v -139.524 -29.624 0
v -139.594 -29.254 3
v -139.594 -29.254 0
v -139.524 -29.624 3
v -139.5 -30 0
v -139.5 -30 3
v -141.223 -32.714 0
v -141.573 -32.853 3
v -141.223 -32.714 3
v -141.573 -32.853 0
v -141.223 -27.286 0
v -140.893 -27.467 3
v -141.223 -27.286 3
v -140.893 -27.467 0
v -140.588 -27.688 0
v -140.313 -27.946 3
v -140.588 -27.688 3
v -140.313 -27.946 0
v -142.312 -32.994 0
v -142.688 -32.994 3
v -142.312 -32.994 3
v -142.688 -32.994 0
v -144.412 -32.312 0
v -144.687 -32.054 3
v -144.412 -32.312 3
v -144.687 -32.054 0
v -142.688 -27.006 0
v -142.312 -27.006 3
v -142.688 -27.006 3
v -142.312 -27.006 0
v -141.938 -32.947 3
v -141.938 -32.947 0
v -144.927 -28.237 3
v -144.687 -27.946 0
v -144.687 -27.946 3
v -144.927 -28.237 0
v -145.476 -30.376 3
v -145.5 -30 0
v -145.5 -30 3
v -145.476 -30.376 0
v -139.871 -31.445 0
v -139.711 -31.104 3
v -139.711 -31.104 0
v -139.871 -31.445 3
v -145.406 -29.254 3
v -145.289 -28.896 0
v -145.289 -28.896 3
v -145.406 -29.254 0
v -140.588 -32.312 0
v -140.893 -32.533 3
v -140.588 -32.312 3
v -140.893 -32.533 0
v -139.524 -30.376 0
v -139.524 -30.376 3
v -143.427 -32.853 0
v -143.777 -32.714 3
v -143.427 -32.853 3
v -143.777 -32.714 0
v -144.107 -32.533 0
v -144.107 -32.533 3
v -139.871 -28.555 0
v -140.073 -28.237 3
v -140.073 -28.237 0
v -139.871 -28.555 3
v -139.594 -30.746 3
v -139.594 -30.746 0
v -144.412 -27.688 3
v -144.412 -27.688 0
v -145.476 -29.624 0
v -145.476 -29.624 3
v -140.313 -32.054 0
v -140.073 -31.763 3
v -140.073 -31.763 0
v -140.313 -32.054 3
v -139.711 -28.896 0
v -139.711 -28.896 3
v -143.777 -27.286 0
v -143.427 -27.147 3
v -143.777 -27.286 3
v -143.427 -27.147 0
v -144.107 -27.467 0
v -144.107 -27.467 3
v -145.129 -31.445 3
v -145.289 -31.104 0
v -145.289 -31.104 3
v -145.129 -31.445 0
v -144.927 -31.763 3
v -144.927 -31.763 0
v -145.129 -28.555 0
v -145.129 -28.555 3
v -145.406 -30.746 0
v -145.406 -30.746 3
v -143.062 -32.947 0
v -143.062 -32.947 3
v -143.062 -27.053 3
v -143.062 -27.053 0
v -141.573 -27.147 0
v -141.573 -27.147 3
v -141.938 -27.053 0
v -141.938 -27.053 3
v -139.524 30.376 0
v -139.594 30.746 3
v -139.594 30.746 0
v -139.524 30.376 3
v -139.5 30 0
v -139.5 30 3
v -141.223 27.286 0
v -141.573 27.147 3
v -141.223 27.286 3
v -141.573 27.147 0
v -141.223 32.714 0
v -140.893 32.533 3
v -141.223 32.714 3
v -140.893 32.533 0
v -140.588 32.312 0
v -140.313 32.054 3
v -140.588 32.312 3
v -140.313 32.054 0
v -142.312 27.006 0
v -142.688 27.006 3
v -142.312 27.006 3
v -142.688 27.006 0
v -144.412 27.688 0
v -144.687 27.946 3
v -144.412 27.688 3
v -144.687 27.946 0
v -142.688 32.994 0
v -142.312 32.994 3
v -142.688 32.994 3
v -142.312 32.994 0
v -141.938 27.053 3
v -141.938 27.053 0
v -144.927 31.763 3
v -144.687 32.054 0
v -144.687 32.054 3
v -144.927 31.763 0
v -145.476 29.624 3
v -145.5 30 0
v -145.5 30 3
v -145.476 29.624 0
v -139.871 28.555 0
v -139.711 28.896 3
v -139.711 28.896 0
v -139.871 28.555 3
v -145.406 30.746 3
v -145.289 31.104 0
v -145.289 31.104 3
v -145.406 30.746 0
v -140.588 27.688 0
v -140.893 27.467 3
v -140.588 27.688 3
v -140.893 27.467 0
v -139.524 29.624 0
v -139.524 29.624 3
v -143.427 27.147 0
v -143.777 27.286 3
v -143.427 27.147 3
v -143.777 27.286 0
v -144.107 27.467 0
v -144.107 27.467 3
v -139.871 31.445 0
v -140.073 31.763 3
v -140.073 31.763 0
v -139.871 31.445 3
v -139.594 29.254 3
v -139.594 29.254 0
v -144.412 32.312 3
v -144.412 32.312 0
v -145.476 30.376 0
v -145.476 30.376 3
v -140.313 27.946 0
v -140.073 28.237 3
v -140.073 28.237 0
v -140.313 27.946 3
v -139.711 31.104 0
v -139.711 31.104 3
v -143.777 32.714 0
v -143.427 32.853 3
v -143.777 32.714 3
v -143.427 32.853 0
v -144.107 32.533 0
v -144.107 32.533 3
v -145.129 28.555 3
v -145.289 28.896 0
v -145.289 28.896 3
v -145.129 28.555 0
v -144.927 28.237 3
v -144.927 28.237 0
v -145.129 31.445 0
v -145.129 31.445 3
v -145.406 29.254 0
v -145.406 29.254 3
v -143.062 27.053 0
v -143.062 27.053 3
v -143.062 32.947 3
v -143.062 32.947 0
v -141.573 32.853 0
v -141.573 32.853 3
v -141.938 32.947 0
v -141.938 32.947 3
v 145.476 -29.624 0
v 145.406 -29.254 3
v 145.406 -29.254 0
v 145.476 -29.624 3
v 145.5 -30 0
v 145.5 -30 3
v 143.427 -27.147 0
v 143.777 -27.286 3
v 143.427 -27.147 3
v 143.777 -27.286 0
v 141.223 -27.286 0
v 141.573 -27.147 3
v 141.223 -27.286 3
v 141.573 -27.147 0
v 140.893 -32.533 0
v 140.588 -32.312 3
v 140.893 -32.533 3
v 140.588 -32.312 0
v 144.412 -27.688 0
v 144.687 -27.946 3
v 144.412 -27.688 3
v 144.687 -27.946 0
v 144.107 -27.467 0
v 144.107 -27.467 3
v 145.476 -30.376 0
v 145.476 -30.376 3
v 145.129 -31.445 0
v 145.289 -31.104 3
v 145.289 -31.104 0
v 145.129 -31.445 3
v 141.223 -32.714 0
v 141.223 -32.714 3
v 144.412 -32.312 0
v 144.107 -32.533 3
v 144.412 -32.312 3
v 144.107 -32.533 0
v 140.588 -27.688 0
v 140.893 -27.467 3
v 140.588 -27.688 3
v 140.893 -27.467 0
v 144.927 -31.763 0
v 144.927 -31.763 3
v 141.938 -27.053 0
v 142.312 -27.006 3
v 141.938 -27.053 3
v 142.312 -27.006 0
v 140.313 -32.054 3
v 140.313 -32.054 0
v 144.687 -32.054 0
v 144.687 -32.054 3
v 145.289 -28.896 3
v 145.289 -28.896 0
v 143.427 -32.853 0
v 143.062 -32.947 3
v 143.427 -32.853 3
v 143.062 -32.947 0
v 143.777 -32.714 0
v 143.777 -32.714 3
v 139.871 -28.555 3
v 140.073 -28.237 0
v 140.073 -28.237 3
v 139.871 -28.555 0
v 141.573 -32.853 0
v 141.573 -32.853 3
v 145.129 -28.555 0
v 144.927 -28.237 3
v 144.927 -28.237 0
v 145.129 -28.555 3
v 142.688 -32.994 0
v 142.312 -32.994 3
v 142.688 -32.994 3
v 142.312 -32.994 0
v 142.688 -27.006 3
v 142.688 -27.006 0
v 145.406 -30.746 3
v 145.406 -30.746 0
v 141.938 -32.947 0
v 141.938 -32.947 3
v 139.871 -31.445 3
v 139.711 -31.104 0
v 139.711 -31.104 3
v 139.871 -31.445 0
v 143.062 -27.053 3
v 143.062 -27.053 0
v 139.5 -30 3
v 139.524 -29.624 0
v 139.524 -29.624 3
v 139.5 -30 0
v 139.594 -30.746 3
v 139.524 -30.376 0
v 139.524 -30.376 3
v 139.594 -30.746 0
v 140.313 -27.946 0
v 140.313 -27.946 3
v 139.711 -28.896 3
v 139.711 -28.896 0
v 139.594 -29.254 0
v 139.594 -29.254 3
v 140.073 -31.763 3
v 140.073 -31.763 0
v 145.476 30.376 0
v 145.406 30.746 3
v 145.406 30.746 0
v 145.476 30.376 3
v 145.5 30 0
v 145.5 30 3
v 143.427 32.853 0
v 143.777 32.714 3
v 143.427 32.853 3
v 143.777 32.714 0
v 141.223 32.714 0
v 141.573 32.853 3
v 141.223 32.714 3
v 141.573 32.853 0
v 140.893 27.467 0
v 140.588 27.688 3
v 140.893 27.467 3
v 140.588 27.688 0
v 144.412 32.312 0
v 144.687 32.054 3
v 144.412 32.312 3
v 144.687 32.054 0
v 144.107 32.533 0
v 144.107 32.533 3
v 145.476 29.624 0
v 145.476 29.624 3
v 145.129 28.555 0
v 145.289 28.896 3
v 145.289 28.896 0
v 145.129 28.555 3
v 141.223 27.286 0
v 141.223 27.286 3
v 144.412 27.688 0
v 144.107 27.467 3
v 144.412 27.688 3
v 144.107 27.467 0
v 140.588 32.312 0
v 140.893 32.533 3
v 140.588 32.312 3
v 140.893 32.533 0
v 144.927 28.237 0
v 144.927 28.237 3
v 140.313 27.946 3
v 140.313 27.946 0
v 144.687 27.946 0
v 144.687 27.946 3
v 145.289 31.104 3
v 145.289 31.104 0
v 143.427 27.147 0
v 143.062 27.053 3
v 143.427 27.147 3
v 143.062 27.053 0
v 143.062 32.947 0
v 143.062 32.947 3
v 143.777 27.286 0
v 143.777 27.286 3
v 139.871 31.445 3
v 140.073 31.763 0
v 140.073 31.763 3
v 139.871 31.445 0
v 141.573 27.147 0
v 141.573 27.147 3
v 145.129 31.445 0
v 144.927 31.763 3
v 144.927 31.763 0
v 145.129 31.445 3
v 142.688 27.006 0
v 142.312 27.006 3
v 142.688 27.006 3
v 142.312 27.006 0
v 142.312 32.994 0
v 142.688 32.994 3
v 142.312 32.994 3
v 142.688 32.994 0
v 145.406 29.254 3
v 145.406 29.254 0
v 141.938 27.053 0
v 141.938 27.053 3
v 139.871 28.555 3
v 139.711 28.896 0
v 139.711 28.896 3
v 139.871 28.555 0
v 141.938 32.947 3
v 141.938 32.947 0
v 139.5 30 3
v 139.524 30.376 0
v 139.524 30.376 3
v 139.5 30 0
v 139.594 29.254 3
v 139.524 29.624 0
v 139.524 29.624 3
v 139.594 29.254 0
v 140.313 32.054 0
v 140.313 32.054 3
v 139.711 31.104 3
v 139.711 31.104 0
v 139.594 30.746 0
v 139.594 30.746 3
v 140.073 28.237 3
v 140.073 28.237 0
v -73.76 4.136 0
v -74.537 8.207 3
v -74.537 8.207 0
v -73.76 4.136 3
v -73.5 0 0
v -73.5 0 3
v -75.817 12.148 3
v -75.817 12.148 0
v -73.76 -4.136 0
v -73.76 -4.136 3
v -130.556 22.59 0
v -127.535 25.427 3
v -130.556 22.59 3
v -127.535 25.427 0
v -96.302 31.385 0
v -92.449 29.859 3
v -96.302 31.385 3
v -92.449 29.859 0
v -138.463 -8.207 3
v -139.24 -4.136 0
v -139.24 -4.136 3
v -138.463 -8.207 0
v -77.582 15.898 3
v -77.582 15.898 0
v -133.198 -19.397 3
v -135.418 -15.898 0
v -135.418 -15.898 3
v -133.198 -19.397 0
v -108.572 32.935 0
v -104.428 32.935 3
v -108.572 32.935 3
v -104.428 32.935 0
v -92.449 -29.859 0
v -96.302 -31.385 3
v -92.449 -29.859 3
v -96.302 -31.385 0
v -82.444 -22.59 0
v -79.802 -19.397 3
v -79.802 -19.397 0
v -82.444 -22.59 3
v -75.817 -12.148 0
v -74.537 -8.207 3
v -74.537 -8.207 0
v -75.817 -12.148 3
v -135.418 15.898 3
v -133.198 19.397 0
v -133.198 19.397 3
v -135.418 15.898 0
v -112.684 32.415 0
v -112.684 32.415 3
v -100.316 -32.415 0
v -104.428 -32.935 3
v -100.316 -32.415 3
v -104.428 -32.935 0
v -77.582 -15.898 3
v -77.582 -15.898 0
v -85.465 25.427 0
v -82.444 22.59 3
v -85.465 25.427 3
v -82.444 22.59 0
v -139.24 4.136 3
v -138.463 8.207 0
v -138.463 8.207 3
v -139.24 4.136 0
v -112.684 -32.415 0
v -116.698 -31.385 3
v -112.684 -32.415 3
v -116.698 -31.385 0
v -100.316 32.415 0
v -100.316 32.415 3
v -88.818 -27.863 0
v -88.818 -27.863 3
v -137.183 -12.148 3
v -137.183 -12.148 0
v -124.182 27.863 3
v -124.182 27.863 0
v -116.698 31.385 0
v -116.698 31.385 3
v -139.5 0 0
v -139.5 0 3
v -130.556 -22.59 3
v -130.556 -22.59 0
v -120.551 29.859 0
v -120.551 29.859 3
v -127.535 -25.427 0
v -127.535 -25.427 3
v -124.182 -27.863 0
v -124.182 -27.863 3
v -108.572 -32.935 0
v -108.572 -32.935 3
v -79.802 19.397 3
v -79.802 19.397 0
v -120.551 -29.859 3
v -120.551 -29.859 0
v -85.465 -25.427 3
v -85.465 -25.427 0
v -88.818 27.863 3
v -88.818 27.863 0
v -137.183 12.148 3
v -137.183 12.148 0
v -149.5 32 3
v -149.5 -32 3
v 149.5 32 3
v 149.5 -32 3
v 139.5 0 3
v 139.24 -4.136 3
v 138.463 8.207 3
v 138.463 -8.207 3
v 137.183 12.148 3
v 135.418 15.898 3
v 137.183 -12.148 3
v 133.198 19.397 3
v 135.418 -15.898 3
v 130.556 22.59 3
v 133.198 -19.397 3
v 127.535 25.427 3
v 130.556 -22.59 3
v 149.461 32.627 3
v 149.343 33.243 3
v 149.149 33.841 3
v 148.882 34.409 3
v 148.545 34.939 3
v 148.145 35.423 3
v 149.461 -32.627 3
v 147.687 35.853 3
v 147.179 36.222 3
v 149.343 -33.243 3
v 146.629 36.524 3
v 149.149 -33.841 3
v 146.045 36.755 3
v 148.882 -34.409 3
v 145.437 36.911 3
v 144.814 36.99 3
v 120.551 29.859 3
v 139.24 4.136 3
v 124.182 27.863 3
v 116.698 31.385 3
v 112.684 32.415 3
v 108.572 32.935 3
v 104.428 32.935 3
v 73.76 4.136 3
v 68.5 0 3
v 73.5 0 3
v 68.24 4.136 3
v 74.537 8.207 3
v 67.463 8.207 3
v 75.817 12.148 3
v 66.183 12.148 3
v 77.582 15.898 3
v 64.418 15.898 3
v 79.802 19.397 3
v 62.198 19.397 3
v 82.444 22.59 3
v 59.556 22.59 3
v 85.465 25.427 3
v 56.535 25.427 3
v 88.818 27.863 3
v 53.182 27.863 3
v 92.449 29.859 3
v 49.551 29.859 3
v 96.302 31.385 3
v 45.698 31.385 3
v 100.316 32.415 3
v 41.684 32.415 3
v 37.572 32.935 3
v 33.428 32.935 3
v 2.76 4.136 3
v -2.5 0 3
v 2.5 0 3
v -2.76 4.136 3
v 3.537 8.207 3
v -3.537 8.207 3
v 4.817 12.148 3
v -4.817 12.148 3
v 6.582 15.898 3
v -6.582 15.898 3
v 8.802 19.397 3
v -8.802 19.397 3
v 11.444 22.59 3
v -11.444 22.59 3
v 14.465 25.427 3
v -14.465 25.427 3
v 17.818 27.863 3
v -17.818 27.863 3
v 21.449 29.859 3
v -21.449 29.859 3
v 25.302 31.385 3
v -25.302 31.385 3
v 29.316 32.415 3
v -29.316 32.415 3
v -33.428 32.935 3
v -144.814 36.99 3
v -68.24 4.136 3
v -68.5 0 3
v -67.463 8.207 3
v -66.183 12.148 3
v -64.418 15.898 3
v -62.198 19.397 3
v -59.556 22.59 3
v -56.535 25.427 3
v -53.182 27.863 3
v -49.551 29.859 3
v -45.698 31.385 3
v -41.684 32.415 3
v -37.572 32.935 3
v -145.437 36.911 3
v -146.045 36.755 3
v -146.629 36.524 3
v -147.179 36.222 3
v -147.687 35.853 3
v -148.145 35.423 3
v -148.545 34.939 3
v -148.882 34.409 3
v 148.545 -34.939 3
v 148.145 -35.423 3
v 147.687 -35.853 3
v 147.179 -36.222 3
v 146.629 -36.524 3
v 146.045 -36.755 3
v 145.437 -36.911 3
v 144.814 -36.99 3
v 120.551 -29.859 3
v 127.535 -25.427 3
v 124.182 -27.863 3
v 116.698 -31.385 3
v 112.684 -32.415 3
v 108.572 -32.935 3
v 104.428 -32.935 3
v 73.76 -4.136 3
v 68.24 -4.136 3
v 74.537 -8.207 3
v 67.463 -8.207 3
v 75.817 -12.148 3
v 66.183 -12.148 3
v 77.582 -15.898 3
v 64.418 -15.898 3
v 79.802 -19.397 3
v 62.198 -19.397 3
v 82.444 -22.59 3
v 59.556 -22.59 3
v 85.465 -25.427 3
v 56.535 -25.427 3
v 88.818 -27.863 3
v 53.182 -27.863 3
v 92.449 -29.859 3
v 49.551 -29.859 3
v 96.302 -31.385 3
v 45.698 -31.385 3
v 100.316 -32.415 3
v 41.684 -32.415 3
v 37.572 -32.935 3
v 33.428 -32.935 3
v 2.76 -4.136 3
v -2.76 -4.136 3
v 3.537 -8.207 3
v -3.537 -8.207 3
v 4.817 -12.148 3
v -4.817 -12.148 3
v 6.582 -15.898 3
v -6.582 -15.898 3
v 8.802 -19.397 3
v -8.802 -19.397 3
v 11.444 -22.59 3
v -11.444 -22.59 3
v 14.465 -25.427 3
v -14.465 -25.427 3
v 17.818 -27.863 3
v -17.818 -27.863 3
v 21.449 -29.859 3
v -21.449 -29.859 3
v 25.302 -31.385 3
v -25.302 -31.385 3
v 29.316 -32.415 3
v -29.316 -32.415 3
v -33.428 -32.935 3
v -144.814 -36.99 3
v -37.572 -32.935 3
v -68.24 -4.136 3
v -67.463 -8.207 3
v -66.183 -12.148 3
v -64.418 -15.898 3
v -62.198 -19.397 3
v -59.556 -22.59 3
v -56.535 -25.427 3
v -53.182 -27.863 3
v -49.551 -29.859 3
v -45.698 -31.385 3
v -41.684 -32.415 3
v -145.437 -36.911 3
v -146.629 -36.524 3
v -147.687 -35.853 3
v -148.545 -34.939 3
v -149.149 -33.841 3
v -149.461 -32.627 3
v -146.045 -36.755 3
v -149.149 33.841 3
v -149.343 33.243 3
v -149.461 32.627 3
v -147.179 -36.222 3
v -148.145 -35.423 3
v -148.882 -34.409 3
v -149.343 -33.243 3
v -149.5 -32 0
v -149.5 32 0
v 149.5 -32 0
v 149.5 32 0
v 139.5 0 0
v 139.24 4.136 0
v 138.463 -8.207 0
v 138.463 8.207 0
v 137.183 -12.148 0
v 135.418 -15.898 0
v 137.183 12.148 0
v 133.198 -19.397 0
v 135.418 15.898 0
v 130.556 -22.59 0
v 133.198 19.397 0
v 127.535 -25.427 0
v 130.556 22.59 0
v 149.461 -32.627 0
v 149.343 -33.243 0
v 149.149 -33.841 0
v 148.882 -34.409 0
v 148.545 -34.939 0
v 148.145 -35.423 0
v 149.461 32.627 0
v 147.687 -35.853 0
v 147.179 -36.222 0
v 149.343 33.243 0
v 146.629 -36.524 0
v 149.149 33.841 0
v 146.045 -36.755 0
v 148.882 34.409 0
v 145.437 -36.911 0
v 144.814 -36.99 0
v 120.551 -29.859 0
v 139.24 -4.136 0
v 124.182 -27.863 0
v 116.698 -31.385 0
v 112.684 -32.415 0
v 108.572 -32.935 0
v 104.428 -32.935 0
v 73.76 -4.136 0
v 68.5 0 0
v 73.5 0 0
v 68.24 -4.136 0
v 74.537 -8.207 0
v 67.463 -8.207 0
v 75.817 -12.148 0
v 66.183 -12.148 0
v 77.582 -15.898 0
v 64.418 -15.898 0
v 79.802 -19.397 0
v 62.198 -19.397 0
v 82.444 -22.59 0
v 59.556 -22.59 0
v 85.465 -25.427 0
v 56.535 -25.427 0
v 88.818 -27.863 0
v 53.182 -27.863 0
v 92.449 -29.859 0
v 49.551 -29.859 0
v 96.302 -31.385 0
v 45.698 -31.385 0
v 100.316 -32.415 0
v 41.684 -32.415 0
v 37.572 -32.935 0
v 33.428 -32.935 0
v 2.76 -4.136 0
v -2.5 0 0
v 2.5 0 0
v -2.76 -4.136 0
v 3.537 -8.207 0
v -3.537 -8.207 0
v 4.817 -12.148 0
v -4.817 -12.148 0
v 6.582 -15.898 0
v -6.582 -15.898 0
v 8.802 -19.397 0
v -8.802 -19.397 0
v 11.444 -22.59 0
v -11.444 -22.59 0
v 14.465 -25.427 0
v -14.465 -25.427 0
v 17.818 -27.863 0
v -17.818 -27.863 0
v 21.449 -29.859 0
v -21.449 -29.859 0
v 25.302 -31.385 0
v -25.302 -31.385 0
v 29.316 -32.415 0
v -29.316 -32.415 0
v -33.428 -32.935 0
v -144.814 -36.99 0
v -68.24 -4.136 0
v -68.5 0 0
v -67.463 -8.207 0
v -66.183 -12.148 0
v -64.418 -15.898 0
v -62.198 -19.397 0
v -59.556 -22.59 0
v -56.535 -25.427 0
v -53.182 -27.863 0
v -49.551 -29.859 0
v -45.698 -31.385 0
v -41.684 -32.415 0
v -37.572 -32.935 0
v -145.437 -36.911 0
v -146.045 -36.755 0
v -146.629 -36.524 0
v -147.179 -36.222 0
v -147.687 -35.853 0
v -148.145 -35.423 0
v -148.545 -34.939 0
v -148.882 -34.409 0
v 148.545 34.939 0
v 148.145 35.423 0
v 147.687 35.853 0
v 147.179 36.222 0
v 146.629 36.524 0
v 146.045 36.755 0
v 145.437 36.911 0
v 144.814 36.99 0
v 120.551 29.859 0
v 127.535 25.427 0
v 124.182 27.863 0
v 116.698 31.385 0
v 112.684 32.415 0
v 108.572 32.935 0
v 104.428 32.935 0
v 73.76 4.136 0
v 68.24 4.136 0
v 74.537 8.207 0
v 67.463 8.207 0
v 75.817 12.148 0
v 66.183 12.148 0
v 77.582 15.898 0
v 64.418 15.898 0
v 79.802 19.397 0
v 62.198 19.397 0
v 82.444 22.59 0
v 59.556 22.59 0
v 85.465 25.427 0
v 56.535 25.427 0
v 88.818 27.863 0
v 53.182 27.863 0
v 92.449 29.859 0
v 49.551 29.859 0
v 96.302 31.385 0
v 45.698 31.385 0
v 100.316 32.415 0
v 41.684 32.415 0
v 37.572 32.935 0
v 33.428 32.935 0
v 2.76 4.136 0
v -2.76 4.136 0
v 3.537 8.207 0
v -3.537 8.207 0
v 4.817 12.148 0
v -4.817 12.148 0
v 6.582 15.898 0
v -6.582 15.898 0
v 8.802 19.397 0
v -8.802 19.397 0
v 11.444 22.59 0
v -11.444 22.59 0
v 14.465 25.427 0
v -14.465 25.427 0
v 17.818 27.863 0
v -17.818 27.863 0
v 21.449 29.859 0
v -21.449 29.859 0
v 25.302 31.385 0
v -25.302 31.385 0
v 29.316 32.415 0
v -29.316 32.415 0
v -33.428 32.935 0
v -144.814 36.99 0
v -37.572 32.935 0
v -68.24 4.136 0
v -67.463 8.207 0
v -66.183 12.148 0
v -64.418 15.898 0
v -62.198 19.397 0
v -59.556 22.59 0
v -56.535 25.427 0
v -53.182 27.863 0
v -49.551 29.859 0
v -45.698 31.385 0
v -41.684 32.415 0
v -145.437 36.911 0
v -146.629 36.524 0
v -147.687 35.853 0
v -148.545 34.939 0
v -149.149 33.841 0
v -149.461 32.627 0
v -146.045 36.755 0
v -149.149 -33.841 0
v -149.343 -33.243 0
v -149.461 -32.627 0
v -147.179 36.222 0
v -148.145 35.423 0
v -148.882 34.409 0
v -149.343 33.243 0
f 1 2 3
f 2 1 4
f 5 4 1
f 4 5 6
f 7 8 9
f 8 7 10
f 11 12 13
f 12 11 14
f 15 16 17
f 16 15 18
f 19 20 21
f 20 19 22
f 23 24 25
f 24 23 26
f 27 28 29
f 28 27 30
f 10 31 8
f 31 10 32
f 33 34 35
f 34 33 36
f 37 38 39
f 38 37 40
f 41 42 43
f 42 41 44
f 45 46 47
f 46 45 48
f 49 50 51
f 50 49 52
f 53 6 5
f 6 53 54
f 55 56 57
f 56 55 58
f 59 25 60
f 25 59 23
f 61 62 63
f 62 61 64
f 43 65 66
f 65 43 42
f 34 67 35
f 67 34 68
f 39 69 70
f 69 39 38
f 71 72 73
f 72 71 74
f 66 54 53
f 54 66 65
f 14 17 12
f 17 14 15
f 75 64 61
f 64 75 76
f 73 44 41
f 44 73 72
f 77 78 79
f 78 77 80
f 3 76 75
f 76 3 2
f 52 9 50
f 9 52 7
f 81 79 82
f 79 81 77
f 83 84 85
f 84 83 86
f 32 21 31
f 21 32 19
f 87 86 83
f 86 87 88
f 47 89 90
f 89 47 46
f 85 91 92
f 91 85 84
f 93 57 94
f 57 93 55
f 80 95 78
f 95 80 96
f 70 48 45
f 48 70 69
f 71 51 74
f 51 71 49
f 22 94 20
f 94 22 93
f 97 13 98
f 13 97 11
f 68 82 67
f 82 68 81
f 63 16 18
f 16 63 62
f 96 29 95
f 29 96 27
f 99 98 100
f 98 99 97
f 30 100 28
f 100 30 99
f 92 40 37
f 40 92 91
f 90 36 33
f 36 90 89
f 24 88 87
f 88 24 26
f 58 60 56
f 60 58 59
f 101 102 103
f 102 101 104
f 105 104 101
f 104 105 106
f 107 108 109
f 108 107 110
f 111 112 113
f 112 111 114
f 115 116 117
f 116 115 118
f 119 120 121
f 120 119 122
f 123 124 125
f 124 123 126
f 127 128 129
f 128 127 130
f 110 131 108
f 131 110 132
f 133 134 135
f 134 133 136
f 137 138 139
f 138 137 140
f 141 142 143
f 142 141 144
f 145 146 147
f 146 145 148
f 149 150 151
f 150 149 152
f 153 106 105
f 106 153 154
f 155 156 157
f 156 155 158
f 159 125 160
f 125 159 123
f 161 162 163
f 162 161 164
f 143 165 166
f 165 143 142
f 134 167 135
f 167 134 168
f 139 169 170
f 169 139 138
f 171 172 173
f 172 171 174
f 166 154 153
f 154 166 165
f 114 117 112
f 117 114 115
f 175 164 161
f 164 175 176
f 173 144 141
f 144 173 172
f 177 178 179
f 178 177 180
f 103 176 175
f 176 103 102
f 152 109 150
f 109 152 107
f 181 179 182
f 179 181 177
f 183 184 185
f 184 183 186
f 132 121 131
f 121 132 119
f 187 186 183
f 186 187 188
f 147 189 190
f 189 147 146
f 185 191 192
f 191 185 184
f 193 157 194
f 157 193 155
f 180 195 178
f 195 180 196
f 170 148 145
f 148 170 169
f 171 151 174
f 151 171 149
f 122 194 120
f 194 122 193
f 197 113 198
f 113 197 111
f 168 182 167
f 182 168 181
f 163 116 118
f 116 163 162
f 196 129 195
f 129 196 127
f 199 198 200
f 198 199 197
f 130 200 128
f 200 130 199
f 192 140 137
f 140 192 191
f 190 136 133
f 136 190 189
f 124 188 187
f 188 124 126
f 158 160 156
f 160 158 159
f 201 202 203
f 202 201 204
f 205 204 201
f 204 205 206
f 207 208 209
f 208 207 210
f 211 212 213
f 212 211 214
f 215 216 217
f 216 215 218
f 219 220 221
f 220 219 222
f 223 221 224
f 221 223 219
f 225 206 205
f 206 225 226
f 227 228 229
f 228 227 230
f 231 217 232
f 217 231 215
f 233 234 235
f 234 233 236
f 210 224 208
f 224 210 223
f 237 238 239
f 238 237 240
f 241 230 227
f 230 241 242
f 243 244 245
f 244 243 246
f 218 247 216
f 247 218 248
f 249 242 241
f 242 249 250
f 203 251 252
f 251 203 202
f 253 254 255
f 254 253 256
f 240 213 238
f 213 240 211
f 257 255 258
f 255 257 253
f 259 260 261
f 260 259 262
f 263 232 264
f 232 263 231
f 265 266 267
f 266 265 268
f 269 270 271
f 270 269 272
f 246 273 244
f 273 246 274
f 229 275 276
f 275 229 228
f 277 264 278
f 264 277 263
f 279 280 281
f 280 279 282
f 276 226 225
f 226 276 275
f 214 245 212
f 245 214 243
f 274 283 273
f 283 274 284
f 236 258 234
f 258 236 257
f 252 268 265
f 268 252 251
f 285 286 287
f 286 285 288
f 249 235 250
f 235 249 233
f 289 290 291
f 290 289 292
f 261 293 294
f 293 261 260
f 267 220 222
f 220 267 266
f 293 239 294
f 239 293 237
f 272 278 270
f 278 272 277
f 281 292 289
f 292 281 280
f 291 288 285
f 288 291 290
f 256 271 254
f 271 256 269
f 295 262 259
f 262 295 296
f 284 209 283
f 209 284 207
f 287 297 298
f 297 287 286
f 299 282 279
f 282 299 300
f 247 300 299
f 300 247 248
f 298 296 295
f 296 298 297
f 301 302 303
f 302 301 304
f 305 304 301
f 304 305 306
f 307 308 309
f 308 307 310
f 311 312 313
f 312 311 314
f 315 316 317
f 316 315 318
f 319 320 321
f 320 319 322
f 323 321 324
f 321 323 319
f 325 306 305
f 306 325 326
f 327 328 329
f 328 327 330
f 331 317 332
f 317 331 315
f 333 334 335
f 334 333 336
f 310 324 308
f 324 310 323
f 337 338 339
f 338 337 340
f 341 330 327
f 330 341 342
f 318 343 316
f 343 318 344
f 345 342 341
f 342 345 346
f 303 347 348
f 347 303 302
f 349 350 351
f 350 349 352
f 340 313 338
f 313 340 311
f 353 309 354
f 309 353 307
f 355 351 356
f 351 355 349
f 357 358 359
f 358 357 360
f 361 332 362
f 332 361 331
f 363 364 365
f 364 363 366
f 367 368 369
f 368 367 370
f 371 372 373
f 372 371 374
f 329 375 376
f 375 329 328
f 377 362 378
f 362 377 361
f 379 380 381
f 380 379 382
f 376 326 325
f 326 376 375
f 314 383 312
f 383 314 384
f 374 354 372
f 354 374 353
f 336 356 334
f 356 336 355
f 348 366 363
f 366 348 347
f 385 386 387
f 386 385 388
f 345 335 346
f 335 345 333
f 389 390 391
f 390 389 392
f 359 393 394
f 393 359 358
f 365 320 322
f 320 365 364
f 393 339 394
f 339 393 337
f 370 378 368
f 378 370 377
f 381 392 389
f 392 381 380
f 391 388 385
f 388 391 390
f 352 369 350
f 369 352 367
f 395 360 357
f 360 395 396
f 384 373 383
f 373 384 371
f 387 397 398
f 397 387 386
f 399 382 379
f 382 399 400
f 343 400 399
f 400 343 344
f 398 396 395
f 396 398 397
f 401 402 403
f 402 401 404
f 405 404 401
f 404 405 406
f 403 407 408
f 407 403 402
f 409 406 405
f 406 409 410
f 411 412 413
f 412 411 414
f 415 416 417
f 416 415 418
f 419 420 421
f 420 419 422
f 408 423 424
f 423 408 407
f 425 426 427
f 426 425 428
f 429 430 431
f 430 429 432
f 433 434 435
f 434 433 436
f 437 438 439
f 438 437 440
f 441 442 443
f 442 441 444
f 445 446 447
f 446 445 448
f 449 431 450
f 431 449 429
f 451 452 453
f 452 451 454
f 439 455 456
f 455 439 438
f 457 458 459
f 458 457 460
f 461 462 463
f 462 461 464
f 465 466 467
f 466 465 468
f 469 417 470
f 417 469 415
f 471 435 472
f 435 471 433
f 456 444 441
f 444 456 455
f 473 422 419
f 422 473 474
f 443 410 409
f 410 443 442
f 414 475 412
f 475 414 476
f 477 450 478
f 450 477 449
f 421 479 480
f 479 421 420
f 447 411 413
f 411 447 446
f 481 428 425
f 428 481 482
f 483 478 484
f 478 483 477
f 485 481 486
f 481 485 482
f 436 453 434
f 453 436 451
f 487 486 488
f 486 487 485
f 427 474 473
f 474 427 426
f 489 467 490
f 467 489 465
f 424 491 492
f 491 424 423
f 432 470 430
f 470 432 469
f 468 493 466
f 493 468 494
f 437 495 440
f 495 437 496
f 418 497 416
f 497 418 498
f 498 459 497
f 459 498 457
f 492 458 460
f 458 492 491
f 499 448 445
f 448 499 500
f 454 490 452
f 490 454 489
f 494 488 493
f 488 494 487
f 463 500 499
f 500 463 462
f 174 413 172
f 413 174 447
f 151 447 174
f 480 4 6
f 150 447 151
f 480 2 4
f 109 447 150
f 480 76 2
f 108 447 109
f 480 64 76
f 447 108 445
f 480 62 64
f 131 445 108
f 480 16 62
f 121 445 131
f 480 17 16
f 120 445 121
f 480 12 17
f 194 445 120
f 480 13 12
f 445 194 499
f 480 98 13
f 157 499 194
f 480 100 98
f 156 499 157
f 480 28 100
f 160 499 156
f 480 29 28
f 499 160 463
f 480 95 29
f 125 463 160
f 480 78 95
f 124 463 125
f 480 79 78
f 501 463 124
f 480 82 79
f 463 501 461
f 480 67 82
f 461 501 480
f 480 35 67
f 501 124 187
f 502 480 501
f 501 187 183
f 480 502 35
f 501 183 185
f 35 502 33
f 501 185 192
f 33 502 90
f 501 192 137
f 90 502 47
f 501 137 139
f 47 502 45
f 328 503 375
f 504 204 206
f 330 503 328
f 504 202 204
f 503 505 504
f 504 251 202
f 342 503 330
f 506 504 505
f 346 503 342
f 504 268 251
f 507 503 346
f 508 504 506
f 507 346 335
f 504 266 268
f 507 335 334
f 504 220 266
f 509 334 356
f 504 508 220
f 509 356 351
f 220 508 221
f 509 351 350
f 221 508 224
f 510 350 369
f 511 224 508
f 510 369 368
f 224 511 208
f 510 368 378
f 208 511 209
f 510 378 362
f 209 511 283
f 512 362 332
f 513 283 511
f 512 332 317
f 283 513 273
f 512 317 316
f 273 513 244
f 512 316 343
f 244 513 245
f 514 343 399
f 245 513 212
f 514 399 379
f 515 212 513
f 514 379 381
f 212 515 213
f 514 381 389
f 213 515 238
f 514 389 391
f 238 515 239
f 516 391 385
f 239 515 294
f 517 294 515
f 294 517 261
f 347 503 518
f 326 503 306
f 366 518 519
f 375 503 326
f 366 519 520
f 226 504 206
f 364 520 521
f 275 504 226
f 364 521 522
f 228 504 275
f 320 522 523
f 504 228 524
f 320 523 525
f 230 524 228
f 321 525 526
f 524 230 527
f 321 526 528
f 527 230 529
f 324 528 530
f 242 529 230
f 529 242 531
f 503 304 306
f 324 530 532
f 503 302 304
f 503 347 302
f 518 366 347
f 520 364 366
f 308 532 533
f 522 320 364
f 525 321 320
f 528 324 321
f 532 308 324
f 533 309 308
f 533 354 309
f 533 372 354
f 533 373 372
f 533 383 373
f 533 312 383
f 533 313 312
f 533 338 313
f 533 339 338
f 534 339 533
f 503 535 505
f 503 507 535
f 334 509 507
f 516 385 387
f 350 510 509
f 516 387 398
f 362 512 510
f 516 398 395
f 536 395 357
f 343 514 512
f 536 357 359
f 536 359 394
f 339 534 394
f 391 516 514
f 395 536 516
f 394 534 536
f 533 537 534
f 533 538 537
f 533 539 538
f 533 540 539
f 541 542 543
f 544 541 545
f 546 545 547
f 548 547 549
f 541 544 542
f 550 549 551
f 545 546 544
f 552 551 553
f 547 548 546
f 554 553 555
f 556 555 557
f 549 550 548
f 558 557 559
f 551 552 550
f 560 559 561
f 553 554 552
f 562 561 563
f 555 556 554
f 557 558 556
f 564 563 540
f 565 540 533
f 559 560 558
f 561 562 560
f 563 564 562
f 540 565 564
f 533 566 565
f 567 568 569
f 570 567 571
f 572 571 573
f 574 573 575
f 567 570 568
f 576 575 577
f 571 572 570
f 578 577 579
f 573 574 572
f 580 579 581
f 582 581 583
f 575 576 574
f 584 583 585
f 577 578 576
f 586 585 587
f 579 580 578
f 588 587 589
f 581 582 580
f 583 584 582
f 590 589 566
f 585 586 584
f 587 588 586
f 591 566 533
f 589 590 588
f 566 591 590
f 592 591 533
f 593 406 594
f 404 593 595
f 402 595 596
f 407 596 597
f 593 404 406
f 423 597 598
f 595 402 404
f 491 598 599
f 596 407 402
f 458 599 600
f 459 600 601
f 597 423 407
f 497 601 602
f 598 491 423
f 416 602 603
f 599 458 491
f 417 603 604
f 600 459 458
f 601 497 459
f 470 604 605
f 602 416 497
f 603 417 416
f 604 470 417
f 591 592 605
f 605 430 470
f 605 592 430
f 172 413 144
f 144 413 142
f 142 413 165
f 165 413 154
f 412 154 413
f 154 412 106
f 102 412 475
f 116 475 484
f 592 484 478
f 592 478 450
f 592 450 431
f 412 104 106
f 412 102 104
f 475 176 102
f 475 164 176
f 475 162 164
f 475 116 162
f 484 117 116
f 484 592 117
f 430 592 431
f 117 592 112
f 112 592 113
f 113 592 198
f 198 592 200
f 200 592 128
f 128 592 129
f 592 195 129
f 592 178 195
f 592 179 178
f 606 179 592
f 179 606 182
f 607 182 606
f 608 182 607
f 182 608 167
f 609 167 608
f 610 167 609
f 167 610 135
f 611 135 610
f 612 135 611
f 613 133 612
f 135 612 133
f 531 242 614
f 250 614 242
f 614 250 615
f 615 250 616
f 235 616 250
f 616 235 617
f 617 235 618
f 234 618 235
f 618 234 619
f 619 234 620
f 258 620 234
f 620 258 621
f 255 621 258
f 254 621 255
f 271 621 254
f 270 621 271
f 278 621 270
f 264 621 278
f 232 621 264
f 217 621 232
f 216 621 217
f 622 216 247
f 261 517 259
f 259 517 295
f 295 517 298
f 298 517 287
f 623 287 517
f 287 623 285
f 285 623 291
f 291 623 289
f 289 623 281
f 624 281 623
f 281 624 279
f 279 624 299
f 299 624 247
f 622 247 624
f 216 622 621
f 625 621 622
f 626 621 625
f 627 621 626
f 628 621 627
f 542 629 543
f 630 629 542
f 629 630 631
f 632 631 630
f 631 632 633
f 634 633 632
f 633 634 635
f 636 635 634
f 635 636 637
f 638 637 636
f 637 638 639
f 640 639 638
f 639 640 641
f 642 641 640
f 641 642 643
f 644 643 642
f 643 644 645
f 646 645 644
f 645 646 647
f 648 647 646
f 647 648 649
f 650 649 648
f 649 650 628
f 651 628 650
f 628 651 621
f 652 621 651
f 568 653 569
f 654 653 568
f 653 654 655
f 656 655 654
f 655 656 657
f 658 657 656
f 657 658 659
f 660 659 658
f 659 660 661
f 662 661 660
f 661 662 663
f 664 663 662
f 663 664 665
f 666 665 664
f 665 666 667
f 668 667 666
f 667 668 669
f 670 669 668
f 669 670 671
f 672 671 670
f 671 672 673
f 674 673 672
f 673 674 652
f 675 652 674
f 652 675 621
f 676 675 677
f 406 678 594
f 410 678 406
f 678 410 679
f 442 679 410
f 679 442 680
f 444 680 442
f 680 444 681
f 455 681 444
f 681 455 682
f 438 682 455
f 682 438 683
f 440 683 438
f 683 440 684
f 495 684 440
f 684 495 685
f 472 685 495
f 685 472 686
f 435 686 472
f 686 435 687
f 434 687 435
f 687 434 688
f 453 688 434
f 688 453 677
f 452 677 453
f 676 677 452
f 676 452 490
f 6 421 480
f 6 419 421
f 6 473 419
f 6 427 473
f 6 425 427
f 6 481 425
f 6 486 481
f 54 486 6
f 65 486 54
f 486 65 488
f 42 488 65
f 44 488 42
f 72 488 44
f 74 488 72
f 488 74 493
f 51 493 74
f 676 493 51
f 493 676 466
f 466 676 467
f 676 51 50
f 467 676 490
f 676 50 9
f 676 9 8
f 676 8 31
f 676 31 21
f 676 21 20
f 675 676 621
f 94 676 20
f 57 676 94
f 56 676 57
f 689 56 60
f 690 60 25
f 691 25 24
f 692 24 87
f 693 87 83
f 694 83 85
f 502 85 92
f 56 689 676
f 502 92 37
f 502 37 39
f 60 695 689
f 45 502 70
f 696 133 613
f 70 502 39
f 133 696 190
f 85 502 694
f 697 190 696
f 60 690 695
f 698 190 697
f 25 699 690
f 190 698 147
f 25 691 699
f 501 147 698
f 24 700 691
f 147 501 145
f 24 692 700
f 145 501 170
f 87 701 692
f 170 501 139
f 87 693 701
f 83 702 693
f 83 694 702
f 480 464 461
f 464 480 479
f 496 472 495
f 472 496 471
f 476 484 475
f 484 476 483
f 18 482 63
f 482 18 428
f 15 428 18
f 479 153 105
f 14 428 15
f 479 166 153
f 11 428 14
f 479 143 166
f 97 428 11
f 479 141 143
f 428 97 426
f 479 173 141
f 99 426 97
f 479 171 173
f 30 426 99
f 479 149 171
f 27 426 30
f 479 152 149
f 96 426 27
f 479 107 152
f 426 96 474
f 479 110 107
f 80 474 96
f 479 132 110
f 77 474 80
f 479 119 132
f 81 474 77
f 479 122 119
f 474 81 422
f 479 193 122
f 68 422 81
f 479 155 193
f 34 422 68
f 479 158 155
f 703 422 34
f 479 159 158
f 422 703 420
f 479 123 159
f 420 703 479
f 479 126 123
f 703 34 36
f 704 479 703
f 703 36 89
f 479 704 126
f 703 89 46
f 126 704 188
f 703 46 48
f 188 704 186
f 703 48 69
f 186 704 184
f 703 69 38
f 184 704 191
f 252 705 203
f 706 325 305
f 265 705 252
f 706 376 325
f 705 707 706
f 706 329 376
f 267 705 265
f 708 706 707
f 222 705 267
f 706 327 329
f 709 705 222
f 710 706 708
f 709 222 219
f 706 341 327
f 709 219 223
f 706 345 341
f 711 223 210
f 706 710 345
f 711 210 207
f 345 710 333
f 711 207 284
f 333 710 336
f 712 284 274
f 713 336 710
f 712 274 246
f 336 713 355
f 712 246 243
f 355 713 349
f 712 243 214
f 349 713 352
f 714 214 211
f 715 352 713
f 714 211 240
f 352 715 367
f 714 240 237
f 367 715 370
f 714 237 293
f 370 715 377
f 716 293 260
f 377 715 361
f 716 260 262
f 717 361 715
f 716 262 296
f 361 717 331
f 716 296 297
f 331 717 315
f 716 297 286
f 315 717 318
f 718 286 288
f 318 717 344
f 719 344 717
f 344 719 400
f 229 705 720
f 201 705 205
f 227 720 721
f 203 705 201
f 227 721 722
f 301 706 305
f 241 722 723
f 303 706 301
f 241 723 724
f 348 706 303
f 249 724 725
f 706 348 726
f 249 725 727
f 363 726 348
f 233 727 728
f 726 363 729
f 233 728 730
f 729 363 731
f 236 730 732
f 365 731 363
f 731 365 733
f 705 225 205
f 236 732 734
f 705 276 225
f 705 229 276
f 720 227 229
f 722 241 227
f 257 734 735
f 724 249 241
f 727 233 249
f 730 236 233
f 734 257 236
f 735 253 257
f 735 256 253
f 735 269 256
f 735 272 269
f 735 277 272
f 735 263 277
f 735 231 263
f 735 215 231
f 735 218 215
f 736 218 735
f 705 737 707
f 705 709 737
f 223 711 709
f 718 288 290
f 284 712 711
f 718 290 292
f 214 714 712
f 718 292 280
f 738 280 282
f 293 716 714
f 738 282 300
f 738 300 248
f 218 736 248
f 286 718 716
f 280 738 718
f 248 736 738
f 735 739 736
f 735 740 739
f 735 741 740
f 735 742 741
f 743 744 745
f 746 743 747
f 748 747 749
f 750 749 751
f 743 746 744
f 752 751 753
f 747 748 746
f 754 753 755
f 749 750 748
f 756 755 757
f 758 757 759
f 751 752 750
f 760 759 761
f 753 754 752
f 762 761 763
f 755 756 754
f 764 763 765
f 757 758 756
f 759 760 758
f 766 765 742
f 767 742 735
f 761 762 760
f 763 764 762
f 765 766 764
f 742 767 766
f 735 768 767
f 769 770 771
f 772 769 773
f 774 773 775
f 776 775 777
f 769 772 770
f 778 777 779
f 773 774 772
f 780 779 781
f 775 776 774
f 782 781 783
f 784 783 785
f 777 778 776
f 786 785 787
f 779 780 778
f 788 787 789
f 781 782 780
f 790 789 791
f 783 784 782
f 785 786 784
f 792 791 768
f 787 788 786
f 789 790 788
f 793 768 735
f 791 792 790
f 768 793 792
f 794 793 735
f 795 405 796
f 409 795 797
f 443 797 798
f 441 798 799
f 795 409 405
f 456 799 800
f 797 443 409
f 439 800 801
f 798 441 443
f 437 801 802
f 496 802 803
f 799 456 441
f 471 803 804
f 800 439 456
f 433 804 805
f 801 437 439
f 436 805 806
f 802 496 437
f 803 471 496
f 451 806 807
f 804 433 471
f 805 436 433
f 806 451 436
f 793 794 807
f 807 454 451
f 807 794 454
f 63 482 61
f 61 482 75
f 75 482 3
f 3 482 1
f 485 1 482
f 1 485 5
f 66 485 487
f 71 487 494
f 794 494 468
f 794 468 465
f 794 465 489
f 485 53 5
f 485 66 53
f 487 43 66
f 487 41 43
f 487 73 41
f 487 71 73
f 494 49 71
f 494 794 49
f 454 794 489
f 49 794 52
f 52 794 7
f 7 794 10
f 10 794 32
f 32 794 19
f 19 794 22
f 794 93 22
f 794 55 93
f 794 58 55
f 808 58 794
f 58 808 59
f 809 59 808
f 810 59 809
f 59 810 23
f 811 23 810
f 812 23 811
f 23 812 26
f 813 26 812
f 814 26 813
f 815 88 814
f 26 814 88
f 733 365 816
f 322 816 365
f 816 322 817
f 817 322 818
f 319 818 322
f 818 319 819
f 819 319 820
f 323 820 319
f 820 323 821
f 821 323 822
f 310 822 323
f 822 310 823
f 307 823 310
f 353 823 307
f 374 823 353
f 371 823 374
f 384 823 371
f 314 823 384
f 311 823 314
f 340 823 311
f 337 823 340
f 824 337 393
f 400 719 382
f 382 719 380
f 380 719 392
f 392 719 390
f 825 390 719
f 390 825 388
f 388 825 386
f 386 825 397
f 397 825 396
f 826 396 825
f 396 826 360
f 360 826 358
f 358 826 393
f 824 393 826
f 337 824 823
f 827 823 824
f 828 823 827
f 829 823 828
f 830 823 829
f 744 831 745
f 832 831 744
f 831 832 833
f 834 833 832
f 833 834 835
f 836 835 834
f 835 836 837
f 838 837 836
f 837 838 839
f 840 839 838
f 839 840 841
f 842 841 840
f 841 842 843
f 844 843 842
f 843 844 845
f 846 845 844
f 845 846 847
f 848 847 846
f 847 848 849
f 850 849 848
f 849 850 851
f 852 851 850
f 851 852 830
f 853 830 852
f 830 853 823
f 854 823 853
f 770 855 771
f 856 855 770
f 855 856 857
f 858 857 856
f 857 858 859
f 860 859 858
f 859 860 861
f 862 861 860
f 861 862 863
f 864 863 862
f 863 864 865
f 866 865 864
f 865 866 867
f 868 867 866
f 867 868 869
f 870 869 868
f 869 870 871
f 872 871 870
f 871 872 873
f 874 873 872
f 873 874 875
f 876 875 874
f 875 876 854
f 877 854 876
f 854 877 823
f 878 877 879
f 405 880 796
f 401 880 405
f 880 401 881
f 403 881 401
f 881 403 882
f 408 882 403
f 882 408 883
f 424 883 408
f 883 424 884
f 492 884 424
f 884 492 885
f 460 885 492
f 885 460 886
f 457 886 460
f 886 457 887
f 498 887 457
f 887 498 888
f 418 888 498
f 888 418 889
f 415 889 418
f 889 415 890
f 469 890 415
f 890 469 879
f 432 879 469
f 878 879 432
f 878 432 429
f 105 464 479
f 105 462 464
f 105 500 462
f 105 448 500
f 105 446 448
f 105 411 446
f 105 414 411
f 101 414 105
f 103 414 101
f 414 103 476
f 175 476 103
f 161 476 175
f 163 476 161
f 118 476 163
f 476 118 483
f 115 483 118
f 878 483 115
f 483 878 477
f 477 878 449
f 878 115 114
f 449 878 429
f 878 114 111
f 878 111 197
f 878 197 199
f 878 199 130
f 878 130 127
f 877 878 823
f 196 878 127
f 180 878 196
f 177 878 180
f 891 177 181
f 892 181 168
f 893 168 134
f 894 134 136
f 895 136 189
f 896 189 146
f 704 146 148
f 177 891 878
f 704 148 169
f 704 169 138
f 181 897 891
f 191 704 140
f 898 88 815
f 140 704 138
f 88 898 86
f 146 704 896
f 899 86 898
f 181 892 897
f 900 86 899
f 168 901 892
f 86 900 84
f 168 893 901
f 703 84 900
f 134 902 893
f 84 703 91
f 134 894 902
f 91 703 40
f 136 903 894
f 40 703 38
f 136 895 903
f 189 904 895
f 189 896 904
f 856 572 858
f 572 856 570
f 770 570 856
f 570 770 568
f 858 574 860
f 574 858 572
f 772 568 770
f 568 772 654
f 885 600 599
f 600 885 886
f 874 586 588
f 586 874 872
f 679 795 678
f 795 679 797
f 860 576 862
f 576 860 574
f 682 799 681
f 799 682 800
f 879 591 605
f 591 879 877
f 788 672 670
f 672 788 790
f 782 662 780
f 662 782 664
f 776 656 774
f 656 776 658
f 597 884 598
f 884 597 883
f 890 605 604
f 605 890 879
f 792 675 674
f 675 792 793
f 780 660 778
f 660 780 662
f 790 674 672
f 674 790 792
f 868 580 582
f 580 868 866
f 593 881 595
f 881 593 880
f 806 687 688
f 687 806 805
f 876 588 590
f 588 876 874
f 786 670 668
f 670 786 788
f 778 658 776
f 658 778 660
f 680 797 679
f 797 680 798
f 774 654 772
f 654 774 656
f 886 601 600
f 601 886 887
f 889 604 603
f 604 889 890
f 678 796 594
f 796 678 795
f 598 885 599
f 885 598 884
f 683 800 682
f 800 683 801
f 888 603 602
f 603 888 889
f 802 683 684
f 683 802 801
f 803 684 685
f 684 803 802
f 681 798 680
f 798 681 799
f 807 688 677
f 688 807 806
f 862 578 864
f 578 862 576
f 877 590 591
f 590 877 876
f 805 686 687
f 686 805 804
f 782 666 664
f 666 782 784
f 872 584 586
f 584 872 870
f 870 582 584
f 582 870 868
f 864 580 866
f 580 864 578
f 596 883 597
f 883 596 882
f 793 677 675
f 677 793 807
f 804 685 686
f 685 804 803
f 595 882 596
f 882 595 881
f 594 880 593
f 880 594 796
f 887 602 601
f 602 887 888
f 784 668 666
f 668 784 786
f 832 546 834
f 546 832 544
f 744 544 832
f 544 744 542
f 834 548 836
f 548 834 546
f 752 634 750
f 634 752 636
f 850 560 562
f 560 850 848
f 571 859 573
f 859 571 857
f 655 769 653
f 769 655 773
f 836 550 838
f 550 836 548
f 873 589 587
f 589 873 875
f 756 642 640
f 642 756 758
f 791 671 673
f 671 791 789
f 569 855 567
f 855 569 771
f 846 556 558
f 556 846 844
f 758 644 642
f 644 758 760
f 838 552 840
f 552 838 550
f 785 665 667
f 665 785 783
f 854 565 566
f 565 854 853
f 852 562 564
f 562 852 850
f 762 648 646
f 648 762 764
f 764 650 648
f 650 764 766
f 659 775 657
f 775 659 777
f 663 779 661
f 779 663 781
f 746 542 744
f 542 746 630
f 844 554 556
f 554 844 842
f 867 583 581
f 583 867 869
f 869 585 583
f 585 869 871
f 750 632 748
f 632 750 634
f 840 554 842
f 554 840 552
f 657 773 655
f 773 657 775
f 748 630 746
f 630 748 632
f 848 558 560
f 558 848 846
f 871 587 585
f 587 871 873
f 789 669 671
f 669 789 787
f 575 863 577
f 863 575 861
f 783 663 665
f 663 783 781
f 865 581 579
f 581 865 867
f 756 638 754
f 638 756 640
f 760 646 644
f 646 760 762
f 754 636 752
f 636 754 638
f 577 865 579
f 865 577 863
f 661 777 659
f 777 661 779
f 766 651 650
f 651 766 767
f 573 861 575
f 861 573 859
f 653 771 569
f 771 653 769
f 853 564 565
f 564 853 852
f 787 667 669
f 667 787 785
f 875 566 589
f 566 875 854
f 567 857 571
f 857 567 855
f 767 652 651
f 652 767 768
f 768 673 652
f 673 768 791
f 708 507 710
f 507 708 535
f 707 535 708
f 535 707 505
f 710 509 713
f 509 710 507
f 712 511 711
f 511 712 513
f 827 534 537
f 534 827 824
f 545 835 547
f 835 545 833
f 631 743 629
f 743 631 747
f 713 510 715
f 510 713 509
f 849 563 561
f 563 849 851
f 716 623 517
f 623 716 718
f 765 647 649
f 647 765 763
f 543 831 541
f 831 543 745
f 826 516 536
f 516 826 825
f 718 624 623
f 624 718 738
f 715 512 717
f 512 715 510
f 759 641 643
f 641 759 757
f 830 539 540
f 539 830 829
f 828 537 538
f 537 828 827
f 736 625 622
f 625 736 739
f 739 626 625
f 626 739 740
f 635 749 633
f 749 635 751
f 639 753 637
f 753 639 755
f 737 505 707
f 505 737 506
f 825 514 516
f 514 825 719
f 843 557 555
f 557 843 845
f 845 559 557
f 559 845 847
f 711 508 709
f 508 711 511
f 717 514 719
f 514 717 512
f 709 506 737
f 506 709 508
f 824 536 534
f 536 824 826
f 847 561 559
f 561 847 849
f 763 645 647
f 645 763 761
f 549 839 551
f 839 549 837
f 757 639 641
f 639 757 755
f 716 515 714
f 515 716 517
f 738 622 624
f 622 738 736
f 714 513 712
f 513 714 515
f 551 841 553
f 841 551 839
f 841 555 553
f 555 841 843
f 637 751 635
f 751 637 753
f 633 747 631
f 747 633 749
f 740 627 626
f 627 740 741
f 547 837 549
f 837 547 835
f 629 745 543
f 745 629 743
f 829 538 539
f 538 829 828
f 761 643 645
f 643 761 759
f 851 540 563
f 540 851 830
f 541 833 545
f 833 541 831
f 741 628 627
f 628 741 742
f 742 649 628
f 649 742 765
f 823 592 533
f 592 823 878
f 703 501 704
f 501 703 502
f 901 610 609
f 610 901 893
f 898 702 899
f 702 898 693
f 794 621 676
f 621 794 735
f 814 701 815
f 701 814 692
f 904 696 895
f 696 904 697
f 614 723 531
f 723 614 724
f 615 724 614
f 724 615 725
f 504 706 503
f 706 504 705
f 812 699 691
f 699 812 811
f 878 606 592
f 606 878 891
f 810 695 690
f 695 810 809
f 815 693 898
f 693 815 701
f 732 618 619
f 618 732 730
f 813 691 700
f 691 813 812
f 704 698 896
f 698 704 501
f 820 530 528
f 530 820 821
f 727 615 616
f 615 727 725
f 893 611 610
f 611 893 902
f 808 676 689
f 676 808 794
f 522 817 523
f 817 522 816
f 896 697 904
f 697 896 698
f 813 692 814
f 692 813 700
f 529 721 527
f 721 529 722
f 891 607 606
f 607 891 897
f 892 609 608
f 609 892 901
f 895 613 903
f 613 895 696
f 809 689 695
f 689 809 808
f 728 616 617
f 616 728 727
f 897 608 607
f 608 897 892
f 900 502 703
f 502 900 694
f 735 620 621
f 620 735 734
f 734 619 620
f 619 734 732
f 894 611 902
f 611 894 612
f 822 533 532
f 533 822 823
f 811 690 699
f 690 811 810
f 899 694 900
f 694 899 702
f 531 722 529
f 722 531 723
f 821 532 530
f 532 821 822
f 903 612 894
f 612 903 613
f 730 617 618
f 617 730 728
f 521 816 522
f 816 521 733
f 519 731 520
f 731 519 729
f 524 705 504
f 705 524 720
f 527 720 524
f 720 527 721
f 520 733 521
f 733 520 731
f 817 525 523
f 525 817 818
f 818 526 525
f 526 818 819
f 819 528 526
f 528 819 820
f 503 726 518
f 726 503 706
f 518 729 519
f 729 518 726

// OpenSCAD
$fn = 50;


difference() {
	union() {
		hull() {
			translate(v = [-144.5000000000, 32.0000000000, 0]) {
				cylinder(h = 3, r = 5);
			}
			translate(v = [144.5000000000, 32.0000000000, 0]) {
				cylinder(h = 3, r = 5);
			}
			translate(v = [-144.5000000000, -32.0000000000, 0]) {
				cylinder(h = 3, r = 5);
			}
			translate(v = [144.5000000000, -32.0000000000, 0]) {
				cylinder(h = 3, r = 5);
			}
		}
	}
	union() {
		#translate(v = [-142.5000000000, -30.0000000000, -100.0000000000]) {
			cylinder(h = 200, r = 3.0000000000);
		}
		#translate(v = [-142.5000000000, 30.0000000000, -100.0000000000]) {
			cylinder(h = 200, r = 3.0000000000);
		}
		#translate(v = [142.5000000000, -30.0000000000, -100.0000000000]) {
			cylinder(h = 200, r = 3.0000000000);
		}
		#translate(v = [142.5000000000, 30.0000000000, -100.0000000000]) {
			cylinder(h = 200, r = 3.0000000000);
		}
		#translate(v = [-106.5000000000, 0, 0]) {
			cylinder(h = 3, r = 33.0000000000);
		}
		#translate(v = [-35.5000000000, 0, 0]) {
			cylinder(h = 3, r = 33.0000000000);
		}
		#translate(v = [35.5000000000, 0, 0]) {
			cylinder(h = 3, r = 33.0000000000);
		}
		#translate(v = [106.5000000000, 0, 0]) {
			cylinder(h = 3, r = 33.0000000000);
		}
	}
}
